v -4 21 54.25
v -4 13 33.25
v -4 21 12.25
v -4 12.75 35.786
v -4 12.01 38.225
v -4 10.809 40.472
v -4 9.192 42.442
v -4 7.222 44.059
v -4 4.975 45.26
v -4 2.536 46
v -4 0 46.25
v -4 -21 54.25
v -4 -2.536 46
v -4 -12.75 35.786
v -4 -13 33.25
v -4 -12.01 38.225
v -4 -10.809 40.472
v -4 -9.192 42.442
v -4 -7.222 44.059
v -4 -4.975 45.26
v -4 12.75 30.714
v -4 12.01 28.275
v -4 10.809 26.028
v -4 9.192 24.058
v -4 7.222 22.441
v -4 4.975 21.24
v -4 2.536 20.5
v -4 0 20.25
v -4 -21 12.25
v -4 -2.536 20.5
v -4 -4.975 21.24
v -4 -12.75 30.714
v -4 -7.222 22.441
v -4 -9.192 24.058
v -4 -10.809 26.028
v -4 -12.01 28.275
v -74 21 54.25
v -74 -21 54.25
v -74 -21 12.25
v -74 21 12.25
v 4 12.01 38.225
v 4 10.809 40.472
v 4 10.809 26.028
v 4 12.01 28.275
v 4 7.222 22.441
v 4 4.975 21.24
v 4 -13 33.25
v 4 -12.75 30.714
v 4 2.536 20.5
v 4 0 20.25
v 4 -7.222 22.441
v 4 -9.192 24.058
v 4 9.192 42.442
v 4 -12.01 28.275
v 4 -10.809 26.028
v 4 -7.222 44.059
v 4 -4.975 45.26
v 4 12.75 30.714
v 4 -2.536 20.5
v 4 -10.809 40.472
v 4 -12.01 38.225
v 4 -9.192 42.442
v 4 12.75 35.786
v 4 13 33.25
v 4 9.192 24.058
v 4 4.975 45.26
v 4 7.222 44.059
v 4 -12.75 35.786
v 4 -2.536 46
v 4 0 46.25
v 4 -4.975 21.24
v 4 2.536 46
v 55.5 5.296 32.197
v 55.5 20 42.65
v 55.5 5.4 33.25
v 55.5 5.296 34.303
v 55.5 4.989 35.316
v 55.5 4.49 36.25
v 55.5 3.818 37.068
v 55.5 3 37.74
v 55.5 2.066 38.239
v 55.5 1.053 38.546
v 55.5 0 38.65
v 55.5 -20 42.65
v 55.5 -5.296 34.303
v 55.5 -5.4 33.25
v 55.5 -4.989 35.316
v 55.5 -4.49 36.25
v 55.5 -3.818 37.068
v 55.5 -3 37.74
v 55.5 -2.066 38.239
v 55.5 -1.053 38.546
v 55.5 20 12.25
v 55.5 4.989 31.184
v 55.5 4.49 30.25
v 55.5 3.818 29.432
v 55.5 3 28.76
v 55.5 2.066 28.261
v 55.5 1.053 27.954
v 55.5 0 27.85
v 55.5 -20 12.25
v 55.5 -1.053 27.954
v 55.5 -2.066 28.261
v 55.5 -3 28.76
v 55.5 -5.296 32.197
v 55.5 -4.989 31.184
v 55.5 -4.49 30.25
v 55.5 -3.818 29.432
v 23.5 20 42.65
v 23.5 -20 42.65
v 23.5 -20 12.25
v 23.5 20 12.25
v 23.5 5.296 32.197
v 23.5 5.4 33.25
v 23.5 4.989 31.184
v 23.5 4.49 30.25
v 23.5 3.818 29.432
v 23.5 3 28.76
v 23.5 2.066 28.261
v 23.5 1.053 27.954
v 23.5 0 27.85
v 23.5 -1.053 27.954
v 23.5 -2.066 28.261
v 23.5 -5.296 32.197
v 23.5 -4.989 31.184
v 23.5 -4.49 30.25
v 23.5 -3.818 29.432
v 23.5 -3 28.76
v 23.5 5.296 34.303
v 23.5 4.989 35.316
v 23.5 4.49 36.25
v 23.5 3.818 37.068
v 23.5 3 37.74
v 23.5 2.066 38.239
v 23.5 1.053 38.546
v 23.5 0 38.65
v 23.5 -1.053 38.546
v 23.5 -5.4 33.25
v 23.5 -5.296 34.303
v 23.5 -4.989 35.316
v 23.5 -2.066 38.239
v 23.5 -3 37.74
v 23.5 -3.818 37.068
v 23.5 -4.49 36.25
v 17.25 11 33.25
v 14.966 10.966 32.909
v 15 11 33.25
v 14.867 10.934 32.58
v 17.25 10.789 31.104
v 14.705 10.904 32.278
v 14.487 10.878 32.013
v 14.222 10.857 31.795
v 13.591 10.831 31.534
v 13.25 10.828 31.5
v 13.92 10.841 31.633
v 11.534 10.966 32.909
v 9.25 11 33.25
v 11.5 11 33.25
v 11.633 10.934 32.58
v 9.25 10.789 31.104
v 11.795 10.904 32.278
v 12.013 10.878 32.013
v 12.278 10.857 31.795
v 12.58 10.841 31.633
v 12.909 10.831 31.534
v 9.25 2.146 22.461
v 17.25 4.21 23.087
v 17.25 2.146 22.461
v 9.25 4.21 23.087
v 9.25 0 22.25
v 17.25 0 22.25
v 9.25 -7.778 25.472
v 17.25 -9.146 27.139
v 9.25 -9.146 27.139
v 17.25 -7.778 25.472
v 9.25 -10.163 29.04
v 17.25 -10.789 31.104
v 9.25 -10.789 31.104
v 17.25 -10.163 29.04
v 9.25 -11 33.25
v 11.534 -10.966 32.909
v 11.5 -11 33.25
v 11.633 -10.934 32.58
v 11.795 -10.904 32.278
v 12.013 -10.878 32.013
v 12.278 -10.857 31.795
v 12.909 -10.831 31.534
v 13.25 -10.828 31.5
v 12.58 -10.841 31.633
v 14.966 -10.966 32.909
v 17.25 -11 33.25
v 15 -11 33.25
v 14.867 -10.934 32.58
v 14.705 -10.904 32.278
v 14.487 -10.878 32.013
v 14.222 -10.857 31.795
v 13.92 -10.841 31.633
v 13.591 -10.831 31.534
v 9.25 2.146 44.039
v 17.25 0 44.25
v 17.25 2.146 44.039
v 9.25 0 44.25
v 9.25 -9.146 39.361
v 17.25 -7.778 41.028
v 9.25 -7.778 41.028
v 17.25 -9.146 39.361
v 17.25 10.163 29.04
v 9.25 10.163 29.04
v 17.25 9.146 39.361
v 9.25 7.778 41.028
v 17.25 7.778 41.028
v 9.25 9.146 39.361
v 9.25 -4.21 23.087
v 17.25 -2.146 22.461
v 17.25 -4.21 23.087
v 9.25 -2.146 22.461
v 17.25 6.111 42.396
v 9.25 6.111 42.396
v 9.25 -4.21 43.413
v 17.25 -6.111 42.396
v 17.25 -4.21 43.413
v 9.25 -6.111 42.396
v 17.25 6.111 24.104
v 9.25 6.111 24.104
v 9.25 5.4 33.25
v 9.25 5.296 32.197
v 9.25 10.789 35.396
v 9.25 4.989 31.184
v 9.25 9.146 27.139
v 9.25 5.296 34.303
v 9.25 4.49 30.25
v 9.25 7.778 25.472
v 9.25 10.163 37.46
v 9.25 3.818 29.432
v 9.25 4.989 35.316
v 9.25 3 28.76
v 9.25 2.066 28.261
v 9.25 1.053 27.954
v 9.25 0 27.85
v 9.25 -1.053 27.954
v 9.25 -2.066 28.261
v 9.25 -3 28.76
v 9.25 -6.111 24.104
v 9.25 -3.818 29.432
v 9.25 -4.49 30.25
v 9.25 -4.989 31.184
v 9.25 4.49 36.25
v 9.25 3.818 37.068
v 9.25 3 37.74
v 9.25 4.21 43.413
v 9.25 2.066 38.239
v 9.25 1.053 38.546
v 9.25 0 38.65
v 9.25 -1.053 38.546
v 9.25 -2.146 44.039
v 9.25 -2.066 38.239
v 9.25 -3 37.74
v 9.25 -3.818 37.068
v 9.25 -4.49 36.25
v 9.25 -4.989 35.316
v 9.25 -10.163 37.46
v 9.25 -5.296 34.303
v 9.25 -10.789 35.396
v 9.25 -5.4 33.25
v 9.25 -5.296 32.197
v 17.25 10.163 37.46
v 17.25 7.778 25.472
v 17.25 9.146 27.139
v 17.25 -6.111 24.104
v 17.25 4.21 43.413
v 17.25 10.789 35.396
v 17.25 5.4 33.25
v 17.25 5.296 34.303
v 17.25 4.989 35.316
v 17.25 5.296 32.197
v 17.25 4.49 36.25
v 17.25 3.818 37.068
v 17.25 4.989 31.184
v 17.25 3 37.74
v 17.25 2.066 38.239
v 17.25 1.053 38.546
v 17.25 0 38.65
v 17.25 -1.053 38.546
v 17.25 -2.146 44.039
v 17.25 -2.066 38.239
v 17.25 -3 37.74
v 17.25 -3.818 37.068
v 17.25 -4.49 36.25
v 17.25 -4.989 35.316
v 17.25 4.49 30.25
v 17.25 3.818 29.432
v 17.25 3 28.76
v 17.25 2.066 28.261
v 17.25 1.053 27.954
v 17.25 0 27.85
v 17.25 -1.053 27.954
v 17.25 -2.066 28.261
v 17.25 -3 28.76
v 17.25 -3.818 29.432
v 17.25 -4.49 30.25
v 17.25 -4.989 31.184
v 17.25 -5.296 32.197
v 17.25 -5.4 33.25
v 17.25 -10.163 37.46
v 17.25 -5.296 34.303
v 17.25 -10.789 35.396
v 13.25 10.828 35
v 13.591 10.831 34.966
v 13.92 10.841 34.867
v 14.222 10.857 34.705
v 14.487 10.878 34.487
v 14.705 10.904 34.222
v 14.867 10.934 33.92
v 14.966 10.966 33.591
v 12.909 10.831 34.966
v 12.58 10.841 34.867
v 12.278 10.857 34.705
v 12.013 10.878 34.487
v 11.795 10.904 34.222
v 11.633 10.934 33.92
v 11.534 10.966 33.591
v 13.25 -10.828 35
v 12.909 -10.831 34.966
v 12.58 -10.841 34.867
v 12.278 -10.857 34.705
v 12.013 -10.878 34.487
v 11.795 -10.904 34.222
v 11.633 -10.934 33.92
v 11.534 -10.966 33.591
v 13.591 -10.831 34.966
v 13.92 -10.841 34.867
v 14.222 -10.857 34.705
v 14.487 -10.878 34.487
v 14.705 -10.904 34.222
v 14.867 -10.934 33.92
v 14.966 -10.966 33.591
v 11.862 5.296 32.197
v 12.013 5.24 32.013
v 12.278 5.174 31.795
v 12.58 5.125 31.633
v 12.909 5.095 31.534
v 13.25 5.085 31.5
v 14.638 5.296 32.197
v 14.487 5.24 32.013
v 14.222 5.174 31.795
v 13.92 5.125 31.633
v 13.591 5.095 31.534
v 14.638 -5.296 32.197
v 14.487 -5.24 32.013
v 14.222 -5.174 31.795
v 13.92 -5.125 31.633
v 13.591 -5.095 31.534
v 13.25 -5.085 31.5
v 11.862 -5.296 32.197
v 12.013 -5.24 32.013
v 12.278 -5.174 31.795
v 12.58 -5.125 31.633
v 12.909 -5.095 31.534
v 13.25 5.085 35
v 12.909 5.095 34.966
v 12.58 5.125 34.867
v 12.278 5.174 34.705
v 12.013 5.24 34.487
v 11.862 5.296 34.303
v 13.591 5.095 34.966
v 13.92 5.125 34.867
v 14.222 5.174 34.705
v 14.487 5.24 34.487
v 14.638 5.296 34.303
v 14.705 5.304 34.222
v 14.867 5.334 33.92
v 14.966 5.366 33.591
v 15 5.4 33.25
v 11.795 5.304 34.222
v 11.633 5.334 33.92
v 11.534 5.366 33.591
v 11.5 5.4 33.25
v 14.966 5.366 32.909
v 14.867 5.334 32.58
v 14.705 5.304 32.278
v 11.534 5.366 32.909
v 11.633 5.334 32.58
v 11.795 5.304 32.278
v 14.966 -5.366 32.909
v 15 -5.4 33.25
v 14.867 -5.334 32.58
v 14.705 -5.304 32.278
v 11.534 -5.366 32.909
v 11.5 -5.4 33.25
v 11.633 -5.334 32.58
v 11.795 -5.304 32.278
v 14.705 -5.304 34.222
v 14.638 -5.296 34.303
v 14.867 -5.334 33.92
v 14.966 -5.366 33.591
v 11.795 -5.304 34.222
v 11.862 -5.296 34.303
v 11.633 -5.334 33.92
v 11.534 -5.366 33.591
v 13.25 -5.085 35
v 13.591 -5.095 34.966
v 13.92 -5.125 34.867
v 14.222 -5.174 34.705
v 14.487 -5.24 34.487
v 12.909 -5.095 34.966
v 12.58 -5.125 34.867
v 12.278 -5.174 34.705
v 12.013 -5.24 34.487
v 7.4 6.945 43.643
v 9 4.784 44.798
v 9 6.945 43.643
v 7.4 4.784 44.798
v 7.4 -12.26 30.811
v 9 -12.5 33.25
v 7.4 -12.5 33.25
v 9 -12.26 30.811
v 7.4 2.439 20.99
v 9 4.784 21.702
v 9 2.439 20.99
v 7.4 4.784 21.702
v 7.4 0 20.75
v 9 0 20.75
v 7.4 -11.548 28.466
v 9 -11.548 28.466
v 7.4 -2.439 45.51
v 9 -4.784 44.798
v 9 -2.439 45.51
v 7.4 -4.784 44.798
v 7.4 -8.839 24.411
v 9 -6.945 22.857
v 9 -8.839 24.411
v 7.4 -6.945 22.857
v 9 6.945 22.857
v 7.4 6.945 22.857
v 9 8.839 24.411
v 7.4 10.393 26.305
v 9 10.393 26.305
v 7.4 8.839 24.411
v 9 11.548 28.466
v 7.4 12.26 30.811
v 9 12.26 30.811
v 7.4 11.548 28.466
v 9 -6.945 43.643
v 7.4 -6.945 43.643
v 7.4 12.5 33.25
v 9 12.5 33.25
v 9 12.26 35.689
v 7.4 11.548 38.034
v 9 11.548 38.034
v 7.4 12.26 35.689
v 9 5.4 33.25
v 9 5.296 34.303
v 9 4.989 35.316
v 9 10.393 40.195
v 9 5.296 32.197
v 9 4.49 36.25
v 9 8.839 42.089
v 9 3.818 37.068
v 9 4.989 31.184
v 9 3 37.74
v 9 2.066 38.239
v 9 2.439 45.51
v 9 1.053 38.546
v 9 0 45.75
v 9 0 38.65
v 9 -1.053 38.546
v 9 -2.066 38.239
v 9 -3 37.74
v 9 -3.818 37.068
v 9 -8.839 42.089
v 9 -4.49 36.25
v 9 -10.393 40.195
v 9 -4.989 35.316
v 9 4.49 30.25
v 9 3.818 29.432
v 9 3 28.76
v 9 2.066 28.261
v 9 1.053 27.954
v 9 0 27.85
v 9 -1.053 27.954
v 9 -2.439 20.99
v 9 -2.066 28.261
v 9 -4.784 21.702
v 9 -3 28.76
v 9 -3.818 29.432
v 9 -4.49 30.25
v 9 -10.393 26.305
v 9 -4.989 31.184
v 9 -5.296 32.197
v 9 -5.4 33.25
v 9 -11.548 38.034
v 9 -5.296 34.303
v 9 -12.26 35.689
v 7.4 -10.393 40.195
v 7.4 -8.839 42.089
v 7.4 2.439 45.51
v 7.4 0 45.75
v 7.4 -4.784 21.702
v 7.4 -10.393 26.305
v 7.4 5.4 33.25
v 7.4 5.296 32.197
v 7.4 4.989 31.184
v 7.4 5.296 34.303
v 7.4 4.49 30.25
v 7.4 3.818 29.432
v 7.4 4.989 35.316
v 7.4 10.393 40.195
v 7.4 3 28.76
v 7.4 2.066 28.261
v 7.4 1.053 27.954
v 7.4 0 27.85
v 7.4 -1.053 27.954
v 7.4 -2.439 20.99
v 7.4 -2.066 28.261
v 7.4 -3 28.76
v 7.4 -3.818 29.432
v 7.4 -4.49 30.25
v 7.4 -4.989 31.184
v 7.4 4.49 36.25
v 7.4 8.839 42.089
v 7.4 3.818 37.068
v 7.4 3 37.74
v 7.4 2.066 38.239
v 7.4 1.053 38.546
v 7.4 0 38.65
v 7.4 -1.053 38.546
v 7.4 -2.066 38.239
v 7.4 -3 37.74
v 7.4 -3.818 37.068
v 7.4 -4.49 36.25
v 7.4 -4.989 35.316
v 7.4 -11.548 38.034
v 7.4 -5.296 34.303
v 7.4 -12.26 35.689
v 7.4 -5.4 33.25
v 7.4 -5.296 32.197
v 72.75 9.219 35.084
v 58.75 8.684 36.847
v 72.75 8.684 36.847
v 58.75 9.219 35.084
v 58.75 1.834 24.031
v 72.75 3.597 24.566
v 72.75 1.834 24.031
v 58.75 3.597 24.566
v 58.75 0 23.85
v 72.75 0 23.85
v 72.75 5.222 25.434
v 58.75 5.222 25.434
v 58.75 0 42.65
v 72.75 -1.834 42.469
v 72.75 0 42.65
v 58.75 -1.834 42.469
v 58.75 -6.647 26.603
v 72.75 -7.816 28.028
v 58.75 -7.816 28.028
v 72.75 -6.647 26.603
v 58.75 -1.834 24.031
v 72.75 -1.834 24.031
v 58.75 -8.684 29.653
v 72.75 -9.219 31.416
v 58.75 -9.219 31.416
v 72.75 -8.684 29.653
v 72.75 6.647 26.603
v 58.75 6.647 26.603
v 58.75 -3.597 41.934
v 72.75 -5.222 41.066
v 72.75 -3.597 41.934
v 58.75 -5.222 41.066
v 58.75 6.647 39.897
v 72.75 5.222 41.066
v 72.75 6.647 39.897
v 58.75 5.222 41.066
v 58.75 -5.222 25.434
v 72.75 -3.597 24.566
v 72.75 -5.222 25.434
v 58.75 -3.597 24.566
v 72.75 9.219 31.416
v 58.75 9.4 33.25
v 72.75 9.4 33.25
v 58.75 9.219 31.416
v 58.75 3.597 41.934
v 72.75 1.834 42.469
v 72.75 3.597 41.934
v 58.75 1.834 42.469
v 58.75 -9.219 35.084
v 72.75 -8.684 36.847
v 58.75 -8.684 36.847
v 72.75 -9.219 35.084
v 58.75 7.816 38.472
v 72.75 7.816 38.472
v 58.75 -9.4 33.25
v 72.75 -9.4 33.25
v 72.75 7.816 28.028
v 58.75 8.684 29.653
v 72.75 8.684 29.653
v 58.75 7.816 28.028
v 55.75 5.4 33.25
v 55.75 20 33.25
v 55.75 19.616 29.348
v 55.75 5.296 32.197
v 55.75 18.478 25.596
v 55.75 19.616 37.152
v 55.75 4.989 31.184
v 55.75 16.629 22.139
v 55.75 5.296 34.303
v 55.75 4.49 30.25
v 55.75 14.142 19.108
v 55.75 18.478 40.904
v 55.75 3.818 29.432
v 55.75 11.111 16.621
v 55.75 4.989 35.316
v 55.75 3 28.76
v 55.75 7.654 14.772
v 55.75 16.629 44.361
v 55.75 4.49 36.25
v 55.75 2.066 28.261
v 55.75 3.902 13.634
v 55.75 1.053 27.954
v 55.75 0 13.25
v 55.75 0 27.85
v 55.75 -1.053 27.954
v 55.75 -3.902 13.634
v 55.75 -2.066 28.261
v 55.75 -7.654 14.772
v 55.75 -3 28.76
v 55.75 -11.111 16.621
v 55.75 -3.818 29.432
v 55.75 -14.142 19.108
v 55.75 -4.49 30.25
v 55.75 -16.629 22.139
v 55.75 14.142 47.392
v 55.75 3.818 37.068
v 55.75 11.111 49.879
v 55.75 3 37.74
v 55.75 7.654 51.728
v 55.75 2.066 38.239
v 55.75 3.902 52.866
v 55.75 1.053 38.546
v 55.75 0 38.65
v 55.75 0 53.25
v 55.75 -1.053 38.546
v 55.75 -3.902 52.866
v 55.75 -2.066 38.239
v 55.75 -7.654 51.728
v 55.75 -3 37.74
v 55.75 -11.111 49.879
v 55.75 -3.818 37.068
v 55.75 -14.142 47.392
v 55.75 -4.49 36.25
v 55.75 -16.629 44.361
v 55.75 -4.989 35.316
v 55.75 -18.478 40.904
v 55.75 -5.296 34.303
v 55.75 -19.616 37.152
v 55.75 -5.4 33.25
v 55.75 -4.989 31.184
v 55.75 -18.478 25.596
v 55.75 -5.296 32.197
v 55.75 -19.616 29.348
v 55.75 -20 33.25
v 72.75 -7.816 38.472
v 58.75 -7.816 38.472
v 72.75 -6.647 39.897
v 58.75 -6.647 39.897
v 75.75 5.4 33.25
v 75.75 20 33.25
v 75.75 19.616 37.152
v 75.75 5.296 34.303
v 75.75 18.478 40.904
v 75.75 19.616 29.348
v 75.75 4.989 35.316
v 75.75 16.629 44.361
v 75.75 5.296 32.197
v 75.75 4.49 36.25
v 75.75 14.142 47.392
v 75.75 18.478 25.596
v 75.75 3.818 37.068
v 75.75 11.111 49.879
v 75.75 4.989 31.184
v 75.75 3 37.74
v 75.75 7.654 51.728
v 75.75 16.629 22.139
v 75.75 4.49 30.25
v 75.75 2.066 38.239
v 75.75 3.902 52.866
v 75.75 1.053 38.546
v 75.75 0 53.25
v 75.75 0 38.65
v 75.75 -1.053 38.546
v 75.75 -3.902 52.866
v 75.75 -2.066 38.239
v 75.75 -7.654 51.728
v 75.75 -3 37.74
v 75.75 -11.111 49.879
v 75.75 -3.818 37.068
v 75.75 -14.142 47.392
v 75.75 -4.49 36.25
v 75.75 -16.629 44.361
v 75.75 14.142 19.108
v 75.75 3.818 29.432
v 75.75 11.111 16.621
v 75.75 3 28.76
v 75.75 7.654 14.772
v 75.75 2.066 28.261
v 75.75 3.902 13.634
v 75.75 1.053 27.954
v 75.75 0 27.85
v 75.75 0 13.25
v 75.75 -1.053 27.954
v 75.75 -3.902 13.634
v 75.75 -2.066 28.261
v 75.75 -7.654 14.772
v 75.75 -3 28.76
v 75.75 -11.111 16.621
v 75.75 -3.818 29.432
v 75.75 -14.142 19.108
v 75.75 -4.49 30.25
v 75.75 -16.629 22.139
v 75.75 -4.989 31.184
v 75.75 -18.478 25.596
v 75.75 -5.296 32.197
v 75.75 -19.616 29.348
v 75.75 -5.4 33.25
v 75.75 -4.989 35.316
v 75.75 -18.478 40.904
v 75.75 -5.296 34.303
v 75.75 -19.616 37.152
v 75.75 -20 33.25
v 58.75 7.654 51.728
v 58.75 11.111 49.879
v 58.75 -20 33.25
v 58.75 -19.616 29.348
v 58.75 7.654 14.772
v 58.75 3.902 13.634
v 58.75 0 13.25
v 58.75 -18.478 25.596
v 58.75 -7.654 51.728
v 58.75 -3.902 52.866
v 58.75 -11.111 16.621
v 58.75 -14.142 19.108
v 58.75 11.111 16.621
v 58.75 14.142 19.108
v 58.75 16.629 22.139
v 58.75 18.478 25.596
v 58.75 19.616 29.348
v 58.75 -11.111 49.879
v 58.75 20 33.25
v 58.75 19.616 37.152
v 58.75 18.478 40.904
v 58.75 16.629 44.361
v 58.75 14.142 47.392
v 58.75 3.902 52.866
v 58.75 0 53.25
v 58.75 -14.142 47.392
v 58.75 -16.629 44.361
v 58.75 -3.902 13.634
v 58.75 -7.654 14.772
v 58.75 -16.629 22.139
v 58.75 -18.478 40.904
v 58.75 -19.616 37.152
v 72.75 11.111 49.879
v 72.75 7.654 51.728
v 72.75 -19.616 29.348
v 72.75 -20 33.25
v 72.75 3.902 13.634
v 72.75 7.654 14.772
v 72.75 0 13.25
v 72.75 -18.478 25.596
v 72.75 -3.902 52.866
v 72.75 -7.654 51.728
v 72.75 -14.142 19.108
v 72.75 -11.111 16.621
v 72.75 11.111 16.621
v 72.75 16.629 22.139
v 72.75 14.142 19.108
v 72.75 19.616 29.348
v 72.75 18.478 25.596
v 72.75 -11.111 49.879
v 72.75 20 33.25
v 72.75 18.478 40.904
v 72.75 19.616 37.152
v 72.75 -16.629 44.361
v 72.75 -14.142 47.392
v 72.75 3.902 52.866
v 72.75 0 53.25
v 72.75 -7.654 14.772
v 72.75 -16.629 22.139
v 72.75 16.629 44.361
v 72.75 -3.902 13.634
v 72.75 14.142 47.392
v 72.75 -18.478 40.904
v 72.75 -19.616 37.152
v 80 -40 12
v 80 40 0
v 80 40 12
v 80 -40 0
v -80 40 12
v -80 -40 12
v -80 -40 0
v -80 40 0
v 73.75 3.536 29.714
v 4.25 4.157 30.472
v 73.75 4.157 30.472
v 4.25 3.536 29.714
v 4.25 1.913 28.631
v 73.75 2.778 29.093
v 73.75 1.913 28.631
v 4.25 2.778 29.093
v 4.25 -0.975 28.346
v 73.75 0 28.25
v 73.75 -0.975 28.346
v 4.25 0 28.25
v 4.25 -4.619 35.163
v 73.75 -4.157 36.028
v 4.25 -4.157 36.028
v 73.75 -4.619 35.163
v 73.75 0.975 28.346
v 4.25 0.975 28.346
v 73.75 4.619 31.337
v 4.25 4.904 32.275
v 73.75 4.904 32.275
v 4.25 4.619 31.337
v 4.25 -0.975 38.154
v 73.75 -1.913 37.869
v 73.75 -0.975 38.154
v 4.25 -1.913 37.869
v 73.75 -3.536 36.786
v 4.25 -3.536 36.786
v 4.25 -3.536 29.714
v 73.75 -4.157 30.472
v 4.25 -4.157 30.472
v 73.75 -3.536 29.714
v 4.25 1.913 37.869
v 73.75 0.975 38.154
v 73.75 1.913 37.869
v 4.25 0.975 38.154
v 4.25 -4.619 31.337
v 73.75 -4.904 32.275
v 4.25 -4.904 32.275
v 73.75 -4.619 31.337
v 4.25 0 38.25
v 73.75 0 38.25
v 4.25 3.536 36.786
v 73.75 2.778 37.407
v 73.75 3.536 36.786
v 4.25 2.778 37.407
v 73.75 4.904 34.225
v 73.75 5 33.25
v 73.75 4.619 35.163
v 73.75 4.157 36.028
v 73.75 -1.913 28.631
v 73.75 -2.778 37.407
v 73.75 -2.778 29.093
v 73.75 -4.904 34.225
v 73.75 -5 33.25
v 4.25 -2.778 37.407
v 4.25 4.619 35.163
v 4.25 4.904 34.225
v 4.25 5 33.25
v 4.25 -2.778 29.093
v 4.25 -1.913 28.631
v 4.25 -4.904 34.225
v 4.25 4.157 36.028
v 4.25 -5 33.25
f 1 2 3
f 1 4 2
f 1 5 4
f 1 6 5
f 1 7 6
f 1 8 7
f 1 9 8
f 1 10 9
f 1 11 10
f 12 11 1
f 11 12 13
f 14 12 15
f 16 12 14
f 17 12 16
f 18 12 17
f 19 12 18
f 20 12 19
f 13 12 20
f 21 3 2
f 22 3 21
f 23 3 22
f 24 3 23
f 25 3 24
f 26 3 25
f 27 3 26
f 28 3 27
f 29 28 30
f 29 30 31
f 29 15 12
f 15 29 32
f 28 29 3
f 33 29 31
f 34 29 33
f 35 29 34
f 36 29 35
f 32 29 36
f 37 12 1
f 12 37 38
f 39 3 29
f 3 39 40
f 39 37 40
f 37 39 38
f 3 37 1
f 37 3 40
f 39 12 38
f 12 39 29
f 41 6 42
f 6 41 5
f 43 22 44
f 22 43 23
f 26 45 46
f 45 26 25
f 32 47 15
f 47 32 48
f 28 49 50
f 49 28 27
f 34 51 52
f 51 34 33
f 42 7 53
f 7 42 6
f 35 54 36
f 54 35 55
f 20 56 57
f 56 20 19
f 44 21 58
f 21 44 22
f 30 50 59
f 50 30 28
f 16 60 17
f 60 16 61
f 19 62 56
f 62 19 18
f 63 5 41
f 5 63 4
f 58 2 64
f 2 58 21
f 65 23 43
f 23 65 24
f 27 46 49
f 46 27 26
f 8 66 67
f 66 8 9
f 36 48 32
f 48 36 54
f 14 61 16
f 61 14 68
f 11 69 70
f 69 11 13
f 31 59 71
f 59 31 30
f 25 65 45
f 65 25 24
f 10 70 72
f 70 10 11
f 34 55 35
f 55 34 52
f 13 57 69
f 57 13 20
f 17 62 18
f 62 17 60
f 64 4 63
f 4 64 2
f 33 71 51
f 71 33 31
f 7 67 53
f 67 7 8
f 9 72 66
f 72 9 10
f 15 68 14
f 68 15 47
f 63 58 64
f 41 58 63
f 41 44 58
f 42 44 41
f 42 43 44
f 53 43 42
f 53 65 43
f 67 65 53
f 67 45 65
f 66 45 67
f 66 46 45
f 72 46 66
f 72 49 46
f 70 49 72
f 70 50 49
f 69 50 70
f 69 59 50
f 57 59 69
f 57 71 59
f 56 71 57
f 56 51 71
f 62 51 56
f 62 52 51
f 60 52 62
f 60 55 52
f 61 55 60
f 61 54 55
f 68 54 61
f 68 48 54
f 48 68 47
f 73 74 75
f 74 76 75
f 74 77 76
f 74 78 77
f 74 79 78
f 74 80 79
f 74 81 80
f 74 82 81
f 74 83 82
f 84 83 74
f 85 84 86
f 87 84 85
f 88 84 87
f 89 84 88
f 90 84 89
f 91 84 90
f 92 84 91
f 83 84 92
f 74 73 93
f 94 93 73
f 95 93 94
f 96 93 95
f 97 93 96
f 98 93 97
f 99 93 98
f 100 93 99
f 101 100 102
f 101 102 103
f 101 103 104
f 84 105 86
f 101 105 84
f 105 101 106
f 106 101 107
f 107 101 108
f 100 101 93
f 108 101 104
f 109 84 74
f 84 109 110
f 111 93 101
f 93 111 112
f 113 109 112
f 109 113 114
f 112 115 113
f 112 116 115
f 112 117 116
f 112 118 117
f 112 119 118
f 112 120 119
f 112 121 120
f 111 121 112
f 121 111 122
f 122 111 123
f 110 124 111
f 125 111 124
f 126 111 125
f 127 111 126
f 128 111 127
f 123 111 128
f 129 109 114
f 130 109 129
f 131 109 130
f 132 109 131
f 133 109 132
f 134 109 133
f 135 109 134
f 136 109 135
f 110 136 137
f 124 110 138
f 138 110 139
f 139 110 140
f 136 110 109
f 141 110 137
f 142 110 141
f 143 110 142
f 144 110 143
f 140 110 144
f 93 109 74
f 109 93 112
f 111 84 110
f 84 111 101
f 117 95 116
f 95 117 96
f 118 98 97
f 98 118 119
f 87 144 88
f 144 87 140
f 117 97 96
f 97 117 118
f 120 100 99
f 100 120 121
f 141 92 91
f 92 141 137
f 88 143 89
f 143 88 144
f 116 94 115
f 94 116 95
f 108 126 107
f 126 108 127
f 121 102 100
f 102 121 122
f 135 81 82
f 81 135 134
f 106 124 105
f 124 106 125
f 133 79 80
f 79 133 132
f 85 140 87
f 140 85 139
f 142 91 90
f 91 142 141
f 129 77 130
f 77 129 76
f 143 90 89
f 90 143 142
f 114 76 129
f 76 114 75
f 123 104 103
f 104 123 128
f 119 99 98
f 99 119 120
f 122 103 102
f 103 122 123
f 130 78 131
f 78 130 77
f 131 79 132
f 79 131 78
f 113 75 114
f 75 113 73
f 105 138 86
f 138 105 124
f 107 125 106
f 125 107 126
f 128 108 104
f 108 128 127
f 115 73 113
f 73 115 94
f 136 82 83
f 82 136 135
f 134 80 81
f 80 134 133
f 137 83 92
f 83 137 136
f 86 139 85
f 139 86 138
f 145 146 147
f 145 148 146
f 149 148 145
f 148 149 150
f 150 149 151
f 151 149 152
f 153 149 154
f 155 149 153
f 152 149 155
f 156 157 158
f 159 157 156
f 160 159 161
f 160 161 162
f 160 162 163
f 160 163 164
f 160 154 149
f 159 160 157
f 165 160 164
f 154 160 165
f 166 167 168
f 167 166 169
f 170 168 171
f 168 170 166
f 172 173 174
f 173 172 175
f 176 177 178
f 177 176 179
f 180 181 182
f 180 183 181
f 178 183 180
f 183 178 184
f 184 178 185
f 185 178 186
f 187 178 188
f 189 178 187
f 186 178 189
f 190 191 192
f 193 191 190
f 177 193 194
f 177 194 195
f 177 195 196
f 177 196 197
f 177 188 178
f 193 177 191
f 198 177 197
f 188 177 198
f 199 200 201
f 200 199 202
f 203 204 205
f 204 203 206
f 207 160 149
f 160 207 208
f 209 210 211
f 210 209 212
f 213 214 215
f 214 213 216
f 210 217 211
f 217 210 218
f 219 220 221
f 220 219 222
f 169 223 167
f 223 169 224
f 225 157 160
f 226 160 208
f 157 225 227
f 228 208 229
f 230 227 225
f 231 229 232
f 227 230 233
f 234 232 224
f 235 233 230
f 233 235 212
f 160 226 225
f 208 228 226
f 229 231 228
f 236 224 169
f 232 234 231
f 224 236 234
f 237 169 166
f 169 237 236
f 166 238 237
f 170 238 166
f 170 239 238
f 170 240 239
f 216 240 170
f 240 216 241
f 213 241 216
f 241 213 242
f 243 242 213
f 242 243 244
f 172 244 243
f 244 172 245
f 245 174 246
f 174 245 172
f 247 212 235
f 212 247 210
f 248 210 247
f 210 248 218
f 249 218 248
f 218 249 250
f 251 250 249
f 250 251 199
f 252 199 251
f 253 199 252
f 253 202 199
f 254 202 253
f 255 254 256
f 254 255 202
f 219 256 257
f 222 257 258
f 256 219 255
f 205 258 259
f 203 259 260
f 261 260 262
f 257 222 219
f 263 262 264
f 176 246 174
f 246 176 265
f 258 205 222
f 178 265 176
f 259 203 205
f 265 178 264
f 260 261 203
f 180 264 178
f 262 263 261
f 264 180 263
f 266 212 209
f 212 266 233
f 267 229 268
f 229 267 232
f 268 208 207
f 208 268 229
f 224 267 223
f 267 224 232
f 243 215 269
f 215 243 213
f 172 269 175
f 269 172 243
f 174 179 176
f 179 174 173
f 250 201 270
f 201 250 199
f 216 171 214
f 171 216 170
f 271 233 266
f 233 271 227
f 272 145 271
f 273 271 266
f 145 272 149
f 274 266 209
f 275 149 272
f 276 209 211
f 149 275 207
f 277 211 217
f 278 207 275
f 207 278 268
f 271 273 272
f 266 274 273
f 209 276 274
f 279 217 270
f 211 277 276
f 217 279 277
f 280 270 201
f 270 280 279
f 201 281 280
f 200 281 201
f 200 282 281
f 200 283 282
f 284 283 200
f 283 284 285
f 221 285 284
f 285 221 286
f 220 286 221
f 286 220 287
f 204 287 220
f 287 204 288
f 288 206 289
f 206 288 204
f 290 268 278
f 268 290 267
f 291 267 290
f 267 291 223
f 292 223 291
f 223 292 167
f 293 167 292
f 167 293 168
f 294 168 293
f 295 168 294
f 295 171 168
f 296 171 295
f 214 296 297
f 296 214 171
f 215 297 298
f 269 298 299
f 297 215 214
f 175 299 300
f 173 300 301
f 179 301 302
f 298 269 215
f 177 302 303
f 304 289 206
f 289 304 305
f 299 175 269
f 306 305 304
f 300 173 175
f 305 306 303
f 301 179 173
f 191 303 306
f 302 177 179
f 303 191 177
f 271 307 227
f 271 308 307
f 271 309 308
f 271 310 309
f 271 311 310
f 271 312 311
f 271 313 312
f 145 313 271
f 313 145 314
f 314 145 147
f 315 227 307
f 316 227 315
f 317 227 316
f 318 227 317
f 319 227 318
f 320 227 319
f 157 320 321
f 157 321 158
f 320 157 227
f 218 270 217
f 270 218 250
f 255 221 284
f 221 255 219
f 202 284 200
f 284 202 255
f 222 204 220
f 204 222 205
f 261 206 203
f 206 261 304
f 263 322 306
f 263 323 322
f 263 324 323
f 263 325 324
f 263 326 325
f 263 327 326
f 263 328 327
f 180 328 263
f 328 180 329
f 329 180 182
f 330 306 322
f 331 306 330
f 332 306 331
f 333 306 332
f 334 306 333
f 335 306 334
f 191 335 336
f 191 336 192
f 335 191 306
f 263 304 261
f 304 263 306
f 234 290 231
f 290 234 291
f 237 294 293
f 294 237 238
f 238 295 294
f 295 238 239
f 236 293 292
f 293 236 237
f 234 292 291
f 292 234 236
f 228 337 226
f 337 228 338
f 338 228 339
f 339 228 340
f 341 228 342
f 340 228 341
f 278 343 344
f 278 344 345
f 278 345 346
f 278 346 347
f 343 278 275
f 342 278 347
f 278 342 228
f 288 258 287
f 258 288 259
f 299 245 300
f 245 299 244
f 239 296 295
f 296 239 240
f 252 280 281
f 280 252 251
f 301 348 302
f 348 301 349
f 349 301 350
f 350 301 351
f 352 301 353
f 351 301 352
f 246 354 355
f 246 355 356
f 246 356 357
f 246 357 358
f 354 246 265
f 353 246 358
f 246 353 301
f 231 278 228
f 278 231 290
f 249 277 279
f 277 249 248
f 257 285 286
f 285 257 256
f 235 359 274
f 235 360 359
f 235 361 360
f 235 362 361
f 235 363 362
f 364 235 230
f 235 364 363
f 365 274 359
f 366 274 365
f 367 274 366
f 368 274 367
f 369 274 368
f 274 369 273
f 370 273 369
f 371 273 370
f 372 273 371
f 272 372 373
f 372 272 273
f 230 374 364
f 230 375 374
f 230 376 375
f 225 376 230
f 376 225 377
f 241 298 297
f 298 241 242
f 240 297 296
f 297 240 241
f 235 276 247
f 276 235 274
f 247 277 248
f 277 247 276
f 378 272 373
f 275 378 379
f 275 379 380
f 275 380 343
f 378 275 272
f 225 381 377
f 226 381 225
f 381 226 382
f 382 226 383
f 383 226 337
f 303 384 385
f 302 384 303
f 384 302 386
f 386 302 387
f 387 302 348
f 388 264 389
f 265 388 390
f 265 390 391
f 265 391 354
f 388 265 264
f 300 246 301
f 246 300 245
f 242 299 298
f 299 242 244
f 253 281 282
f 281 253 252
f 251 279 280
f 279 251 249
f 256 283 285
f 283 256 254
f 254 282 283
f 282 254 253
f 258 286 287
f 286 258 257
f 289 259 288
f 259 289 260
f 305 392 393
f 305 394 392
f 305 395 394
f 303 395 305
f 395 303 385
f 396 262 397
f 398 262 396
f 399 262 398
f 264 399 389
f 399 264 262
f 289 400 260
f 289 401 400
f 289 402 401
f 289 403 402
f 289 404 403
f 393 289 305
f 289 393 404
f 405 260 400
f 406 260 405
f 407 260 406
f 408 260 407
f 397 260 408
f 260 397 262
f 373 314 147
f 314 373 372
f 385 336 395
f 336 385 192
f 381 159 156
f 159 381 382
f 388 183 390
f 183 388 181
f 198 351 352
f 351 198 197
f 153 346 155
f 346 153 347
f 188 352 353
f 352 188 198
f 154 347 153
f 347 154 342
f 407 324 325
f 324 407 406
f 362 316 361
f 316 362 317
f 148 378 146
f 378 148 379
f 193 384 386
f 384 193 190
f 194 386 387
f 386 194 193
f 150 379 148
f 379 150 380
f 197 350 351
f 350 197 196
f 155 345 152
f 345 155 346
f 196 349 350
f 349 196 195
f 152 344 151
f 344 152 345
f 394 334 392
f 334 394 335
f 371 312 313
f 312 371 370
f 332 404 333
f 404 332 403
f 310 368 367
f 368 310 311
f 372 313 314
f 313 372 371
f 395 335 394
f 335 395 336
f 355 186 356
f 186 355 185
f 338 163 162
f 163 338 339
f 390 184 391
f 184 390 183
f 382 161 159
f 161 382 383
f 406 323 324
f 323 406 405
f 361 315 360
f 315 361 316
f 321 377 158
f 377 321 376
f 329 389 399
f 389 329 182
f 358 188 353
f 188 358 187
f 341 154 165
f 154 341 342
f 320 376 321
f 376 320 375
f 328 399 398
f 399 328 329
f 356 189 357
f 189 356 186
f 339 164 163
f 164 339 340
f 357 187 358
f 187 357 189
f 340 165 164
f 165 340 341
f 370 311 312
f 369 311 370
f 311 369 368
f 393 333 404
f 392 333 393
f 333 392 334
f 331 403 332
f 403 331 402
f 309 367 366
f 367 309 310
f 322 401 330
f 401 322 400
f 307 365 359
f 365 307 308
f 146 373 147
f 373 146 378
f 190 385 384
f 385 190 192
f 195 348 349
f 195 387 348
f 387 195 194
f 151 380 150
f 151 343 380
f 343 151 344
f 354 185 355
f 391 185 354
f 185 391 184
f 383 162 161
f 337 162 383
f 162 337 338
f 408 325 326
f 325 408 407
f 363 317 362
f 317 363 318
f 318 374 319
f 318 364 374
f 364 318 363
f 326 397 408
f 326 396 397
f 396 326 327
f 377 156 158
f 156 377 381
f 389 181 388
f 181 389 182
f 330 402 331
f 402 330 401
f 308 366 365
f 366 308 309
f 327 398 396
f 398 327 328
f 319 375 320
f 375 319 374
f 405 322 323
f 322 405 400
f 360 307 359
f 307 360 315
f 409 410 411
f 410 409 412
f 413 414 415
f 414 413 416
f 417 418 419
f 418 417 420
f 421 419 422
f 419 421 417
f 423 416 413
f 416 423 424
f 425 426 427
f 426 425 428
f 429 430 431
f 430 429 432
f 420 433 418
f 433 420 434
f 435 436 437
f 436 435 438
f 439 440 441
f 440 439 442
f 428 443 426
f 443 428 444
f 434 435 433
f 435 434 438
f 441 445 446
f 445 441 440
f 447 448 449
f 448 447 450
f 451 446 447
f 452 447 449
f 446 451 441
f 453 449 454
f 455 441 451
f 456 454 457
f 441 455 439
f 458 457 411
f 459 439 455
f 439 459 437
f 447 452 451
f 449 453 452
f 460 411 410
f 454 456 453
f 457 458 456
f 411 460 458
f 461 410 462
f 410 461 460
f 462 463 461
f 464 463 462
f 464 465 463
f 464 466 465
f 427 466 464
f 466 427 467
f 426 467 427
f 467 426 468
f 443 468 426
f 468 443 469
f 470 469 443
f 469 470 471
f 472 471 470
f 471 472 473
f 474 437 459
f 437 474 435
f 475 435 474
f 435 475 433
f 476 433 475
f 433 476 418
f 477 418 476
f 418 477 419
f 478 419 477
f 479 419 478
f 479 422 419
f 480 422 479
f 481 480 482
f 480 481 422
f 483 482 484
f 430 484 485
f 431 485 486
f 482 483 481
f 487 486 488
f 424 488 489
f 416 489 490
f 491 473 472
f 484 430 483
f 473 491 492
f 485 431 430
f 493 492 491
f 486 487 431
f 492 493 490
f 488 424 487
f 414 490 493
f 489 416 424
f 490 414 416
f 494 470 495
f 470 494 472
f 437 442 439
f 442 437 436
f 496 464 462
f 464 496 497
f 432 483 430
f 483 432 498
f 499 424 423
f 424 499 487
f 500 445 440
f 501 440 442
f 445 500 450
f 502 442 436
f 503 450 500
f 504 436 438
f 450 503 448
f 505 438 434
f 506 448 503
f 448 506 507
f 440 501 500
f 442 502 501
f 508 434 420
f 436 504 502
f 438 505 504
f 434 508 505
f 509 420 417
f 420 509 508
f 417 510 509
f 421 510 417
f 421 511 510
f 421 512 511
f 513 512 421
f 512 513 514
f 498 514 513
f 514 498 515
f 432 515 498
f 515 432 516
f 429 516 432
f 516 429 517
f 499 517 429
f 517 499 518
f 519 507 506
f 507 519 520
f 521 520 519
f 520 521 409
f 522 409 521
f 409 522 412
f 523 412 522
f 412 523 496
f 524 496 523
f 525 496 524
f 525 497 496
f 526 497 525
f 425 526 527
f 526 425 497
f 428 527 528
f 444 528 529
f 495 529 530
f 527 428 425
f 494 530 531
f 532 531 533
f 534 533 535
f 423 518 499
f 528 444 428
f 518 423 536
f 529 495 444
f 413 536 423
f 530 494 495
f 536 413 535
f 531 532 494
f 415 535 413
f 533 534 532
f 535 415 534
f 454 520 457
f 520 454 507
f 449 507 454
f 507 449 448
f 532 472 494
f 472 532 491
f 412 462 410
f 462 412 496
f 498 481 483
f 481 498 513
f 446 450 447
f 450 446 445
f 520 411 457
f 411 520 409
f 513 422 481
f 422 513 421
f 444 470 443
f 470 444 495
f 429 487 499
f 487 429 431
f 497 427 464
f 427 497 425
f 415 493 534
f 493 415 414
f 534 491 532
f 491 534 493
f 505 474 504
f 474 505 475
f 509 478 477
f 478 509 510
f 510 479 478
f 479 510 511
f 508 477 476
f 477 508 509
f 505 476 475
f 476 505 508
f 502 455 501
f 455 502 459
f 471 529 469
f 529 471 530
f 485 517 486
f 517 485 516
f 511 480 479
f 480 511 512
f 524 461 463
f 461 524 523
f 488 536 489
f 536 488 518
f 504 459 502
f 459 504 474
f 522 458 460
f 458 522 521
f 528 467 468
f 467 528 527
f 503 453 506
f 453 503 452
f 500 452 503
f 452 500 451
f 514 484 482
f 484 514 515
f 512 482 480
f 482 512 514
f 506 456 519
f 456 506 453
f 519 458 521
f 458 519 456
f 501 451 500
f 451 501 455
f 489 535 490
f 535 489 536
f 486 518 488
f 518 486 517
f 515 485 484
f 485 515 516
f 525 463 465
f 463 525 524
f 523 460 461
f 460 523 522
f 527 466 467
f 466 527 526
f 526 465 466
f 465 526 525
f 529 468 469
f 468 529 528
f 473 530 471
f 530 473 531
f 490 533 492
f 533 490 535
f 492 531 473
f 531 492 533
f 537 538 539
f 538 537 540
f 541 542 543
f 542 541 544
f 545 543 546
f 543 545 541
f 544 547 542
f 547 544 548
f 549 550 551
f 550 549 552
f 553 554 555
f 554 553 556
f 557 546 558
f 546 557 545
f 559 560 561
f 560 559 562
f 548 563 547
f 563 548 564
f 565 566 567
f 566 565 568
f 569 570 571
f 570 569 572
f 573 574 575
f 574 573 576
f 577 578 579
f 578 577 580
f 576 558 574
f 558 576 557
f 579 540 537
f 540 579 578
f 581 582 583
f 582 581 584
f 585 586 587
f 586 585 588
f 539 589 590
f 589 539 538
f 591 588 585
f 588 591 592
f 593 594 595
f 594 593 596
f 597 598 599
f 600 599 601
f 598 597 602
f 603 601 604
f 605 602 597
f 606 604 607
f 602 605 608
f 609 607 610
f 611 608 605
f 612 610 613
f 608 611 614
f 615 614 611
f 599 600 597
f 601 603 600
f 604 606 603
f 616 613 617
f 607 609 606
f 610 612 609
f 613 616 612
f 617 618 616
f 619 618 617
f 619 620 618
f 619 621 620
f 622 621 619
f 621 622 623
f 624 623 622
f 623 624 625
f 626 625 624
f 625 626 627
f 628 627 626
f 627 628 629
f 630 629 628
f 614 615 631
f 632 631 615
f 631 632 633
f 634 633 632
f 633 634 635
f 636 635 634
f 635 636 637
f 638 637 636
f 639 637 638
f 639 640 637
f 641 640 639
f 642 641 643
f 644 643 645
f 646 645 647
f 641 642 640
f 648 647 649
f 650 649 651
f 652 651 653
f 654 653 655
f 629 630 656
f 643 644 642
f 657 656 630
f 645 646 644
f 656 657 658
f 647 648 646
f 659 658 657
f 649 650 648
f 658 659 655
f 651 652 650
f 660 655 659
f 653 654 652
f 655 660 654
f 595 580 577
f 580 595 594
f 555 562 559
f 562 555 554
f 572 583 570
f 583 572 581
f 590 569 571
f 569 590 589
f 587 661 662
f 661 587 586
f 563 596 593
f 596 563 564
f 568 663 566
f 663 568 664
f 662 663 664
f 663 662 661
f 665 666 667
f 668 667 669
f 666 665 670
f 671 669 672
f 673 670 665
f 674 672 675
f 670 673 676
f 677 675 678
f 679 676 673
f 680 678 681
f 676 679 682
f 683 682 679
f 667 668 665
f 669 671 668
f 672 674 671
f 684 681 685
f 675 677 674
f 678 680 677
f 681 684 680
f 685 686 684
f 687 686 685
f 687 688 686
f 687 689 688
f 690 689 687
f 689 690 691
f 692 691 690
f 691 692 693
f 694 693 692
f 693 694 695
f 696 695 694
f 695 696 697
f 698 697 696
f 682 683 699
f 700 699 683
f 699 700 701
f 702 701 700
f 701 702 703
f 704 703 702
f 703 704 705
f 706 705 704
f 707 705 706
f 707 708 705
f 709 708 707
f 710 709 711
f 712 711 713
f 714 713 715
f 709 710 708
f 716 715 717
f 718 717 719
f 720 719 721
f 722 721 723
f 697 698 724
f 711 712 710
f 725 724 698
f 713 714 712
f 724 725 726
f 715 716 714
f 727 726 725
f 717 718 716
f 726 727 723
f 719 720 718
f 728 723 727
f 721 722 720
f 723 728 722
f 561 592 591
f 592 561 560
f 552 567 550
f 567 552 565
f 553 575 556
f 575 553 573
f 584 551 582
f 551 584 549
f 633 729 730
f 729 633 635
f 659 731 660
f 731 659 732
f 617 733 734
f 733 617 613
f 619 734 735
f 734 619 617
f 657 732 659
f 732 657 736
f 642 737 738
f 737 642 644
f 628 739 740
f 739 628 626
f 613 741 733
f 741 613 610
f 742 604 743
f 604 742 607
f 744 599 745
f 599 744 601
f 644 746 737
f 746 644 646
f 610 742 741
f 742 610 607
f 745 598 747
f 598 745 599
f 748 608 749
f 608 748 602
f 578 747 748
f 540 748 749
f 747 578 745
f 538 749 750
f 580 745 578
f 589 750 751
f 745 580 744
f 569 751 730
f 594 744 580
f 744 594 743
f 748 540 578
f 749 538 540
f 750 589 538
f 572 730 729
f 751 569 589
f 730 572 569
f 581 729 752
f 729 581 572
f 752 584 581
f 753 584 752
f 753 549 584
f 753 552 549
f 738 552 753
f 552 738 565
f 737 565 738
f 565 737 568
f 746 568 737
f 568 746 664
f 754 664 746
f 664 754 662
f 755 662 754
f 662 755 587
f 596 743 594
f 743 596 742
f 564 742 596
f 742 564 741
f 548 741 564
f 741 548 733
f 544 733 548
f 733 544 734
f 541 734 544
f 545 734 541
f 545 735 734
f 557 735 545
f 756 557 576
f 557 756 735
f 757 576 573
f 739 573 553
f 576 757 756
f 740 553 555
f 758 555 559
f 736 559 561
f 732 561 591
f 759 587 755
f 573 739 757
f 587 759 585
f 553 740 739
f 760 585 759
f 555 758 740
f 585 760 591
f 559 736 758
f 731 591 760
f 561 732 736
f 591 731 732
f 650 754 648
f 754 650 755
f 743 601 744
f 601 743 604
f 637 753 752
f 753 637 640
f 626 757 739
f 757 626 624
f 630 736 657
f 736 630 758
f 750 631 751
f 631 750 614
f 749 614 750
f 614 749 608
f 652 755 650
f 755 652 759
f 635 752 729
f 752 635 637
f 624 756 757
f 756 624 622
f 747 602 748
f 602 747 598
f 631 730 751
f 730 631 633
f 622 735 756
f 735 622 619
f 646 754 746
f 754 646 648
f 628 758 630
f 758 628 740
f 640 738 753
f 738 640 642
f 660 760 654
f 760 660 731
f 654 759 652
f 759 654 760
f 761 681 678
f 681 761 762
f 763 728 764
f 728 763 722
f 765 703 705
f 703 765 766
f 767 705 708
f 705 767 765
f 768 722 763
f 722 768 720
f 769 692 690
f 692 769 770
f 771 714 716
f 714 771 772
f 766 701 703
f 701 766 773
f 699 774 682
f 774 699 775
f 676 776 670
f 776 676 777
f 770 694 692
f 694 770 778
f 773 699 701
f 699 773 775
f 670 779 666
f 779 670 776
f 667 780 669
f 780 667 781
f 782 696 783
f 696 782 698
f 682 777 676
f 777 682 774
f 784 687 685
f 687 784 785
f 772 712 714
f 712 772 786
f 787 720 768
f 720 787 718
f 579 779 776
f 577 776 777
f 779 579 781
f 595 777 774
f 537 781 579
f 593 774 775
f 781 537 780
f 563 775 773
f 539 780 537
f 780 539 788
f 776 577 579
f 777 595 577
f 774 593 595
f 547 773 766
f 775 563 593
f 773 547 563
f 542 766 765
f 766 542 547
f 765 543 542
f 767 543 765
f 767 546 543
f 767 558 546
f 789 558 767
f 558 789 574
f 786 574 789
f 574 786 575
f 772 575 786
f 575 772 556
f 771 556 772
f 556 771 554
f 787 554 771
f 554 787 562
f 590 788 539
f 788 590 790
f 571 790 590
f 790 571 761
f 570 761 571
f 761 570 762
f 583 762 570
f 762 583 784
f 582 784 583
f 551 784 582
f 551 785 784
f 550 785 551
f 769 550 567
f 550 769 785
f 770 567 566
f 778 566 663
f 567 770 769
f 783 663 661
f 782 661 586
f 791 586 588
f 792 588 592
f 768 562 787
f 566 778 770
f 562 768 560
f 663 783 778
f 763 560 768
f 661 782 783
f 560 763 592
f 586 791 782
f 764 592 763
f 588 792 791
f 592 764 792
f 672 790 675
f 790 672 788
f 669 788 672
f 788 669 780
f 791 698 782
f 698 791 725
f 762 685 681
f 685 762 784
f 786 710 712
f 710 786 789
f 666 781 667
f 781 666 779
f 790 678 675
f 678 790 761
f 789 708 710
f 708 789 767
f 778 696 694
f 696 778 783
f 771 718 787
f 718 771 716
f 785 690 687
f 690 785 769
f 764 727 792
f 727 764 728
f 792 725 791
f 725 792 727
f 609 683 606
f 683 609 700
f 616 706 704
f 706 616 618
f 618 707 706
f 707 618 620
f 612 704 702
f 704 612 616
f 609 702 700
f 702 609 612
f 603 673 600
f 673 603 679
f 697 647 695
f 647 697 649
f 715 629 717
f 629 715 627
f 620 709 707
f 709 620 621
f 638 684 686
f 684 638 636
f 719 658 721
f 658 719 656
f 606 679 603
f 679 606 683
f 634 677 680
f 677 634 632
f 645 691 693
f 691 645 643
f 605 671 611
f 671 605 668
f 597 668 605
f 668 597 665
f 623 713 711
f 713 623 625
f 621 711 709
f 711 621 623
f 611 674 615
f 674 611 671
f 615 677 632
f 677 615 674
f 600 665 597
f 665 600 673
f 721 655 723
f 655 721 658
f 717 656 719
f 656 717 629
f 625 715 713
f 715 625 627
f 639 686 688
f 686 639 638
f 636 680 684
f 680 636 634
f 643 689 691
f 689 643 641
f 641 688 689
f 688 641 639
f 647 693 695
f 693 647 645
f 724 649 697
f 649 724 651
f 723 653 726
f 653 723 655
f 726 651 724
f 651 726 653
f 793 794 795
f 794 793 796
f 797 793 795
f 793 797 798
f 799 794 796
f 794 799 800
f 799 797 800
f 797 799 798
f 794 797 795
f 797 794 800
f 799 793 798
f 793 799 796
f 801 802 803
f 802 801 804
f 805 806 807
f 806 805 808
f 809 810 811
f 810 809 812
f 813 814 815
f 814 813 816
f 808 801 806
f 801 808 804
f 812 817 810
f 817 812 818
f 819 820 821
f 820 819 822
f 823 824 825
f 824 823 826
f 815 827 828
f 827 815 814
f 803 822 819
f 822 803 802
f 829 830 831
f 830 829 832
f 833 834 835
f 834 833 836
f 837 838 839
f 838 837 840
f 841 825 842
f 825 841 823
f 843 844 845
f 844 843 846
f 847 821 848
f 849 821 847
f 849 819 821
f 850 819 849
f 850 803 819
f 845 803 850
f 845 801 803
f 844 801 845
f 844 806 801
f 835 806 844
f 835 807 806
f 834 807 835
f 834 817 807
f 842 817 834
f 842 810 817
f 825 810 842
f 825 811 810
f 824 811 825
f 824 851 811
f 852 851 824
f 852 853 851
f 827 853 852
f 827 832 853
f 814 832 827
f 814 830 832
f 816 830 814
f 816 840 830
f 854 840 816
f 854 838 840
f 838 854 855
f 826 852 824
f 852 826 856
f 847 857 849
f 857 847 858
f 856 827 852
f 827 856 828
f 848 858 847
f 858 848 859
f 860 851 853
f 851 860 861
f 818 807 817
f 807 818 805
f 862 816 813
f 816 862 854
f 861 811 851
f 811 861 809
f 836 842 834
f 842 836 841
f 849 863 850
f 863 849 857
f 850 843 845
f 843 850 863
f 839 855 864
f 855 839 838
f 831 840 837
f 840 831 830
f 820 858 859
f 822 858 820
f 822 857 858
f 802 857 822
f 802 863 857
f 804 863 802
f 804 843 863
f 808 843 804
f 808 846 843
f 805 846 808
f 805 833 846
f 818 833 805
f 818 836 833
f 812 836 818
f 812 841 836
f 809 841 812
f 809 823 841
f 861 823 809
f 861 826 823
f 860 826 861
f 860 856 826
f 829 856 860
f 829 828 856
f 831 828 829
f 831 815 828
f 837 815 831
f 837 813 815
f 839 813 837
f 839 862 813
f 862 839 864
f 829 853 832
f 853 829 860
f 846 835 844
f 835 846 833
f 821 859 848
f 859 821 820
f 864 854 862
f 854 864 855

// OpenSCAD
$fn = 32;

// ------------------------------------------------------------------------
// Motor drive station: motor 70 x 42 mm, shaft d10, pulley d40
// Every part is its own module, assembly() places every instance.
// ------------------------------------------------------------------------

// --- part 1 ---
module station_bed() {
  difference() {
    translate([-80, -40, 0]) cube([160, 80, 12]);
  }
}

// --- part 2 ---
module drive_motor() {
  union() {
    translate([-35, -21, 0]) cube([70, 42, 42]);
    translate([39, 0, 21]) rotate([0, 90, 0]) cylinder(h = 8, d = 26, center = true);
  }
}

// --- part 3 ---
module pillow_block() {
  difference() {
    translate([-16, -20, 0]) cube([32, 40, 30.4]);
    translate([0, 0, 21]) rotate([0, 90, 0]) cylinder(h = 34, d = 10.8, center = true);
  }
}

// --- part 4 ---
module drive_shaft() {
  translate([0, 0, -34.75]) cylinder(h = 69.5, d = 10);
}

// --- part 5 ---
module shaft_collar() {
  difference() {
    cylinder(h = 8, d = 22);
    translate([0, 0, -1]) cylinder(h = 10, d = 10.8);
    translate([0, 0, 4]) rotate([90, 0, 0]) cylinder(h = 24, d = 3.5, center = true);
  }
}

// --- part 6 ---
module collar_washer() {
  difference() {
      translate([0, 0, 0]) cylinder(h = 1.6, d = 25);
      translate([0, 0, -1]) cylinder(h = 3.6, d = 10.8);
    }
}

// --- part 7 ---
module drive_pulley() {
  difference() {
    union() {
      cylinder(h = 20, d = 18.8);
      cylinder(h = 3, d = 40);
      translate([0, 0, 17]) cylinder(h = 3, d = 40);
    }
    translate([0, 0, -1]) cylinder(h = 22, d = 10.8);
  }
}

// --- assembly ---
module assembly() {
  color([0.80, 0.24, 0.20]) translate([0, 0, 0]) rotate([0, 0, 0]) station_bed();
  color([0.20, 0.45, 0.75]) translate([-39, 0, 12.25]) rotate([0, 0, 0]) drive_motor();
  color([0.25, 0.62, 0.32]) translate([39.5, 0, 12.25]) rotate([0, 0, 0]) pillow_block();
  color([0.92, 0.70, 0.18]) translate([39, 0, 33.25]) rotate([0, 90, 0]) drive_shaft();
  color([0.58, 0.35, 0.70]) translate([9.25, 0, 33.25]) rotate([0, 90, 0]) shaft_collar();
  color([0.16, 0.66, 0.66]) translate([7.4, 0, 33.25]) rotate([0, 90, 0]) collar_washer();
  color([0.85, 0.48, 0.18]) translate([55.75, 0, 33.25]) rotate([0, 90, 0]) drive_pulley();
}

assembly();
